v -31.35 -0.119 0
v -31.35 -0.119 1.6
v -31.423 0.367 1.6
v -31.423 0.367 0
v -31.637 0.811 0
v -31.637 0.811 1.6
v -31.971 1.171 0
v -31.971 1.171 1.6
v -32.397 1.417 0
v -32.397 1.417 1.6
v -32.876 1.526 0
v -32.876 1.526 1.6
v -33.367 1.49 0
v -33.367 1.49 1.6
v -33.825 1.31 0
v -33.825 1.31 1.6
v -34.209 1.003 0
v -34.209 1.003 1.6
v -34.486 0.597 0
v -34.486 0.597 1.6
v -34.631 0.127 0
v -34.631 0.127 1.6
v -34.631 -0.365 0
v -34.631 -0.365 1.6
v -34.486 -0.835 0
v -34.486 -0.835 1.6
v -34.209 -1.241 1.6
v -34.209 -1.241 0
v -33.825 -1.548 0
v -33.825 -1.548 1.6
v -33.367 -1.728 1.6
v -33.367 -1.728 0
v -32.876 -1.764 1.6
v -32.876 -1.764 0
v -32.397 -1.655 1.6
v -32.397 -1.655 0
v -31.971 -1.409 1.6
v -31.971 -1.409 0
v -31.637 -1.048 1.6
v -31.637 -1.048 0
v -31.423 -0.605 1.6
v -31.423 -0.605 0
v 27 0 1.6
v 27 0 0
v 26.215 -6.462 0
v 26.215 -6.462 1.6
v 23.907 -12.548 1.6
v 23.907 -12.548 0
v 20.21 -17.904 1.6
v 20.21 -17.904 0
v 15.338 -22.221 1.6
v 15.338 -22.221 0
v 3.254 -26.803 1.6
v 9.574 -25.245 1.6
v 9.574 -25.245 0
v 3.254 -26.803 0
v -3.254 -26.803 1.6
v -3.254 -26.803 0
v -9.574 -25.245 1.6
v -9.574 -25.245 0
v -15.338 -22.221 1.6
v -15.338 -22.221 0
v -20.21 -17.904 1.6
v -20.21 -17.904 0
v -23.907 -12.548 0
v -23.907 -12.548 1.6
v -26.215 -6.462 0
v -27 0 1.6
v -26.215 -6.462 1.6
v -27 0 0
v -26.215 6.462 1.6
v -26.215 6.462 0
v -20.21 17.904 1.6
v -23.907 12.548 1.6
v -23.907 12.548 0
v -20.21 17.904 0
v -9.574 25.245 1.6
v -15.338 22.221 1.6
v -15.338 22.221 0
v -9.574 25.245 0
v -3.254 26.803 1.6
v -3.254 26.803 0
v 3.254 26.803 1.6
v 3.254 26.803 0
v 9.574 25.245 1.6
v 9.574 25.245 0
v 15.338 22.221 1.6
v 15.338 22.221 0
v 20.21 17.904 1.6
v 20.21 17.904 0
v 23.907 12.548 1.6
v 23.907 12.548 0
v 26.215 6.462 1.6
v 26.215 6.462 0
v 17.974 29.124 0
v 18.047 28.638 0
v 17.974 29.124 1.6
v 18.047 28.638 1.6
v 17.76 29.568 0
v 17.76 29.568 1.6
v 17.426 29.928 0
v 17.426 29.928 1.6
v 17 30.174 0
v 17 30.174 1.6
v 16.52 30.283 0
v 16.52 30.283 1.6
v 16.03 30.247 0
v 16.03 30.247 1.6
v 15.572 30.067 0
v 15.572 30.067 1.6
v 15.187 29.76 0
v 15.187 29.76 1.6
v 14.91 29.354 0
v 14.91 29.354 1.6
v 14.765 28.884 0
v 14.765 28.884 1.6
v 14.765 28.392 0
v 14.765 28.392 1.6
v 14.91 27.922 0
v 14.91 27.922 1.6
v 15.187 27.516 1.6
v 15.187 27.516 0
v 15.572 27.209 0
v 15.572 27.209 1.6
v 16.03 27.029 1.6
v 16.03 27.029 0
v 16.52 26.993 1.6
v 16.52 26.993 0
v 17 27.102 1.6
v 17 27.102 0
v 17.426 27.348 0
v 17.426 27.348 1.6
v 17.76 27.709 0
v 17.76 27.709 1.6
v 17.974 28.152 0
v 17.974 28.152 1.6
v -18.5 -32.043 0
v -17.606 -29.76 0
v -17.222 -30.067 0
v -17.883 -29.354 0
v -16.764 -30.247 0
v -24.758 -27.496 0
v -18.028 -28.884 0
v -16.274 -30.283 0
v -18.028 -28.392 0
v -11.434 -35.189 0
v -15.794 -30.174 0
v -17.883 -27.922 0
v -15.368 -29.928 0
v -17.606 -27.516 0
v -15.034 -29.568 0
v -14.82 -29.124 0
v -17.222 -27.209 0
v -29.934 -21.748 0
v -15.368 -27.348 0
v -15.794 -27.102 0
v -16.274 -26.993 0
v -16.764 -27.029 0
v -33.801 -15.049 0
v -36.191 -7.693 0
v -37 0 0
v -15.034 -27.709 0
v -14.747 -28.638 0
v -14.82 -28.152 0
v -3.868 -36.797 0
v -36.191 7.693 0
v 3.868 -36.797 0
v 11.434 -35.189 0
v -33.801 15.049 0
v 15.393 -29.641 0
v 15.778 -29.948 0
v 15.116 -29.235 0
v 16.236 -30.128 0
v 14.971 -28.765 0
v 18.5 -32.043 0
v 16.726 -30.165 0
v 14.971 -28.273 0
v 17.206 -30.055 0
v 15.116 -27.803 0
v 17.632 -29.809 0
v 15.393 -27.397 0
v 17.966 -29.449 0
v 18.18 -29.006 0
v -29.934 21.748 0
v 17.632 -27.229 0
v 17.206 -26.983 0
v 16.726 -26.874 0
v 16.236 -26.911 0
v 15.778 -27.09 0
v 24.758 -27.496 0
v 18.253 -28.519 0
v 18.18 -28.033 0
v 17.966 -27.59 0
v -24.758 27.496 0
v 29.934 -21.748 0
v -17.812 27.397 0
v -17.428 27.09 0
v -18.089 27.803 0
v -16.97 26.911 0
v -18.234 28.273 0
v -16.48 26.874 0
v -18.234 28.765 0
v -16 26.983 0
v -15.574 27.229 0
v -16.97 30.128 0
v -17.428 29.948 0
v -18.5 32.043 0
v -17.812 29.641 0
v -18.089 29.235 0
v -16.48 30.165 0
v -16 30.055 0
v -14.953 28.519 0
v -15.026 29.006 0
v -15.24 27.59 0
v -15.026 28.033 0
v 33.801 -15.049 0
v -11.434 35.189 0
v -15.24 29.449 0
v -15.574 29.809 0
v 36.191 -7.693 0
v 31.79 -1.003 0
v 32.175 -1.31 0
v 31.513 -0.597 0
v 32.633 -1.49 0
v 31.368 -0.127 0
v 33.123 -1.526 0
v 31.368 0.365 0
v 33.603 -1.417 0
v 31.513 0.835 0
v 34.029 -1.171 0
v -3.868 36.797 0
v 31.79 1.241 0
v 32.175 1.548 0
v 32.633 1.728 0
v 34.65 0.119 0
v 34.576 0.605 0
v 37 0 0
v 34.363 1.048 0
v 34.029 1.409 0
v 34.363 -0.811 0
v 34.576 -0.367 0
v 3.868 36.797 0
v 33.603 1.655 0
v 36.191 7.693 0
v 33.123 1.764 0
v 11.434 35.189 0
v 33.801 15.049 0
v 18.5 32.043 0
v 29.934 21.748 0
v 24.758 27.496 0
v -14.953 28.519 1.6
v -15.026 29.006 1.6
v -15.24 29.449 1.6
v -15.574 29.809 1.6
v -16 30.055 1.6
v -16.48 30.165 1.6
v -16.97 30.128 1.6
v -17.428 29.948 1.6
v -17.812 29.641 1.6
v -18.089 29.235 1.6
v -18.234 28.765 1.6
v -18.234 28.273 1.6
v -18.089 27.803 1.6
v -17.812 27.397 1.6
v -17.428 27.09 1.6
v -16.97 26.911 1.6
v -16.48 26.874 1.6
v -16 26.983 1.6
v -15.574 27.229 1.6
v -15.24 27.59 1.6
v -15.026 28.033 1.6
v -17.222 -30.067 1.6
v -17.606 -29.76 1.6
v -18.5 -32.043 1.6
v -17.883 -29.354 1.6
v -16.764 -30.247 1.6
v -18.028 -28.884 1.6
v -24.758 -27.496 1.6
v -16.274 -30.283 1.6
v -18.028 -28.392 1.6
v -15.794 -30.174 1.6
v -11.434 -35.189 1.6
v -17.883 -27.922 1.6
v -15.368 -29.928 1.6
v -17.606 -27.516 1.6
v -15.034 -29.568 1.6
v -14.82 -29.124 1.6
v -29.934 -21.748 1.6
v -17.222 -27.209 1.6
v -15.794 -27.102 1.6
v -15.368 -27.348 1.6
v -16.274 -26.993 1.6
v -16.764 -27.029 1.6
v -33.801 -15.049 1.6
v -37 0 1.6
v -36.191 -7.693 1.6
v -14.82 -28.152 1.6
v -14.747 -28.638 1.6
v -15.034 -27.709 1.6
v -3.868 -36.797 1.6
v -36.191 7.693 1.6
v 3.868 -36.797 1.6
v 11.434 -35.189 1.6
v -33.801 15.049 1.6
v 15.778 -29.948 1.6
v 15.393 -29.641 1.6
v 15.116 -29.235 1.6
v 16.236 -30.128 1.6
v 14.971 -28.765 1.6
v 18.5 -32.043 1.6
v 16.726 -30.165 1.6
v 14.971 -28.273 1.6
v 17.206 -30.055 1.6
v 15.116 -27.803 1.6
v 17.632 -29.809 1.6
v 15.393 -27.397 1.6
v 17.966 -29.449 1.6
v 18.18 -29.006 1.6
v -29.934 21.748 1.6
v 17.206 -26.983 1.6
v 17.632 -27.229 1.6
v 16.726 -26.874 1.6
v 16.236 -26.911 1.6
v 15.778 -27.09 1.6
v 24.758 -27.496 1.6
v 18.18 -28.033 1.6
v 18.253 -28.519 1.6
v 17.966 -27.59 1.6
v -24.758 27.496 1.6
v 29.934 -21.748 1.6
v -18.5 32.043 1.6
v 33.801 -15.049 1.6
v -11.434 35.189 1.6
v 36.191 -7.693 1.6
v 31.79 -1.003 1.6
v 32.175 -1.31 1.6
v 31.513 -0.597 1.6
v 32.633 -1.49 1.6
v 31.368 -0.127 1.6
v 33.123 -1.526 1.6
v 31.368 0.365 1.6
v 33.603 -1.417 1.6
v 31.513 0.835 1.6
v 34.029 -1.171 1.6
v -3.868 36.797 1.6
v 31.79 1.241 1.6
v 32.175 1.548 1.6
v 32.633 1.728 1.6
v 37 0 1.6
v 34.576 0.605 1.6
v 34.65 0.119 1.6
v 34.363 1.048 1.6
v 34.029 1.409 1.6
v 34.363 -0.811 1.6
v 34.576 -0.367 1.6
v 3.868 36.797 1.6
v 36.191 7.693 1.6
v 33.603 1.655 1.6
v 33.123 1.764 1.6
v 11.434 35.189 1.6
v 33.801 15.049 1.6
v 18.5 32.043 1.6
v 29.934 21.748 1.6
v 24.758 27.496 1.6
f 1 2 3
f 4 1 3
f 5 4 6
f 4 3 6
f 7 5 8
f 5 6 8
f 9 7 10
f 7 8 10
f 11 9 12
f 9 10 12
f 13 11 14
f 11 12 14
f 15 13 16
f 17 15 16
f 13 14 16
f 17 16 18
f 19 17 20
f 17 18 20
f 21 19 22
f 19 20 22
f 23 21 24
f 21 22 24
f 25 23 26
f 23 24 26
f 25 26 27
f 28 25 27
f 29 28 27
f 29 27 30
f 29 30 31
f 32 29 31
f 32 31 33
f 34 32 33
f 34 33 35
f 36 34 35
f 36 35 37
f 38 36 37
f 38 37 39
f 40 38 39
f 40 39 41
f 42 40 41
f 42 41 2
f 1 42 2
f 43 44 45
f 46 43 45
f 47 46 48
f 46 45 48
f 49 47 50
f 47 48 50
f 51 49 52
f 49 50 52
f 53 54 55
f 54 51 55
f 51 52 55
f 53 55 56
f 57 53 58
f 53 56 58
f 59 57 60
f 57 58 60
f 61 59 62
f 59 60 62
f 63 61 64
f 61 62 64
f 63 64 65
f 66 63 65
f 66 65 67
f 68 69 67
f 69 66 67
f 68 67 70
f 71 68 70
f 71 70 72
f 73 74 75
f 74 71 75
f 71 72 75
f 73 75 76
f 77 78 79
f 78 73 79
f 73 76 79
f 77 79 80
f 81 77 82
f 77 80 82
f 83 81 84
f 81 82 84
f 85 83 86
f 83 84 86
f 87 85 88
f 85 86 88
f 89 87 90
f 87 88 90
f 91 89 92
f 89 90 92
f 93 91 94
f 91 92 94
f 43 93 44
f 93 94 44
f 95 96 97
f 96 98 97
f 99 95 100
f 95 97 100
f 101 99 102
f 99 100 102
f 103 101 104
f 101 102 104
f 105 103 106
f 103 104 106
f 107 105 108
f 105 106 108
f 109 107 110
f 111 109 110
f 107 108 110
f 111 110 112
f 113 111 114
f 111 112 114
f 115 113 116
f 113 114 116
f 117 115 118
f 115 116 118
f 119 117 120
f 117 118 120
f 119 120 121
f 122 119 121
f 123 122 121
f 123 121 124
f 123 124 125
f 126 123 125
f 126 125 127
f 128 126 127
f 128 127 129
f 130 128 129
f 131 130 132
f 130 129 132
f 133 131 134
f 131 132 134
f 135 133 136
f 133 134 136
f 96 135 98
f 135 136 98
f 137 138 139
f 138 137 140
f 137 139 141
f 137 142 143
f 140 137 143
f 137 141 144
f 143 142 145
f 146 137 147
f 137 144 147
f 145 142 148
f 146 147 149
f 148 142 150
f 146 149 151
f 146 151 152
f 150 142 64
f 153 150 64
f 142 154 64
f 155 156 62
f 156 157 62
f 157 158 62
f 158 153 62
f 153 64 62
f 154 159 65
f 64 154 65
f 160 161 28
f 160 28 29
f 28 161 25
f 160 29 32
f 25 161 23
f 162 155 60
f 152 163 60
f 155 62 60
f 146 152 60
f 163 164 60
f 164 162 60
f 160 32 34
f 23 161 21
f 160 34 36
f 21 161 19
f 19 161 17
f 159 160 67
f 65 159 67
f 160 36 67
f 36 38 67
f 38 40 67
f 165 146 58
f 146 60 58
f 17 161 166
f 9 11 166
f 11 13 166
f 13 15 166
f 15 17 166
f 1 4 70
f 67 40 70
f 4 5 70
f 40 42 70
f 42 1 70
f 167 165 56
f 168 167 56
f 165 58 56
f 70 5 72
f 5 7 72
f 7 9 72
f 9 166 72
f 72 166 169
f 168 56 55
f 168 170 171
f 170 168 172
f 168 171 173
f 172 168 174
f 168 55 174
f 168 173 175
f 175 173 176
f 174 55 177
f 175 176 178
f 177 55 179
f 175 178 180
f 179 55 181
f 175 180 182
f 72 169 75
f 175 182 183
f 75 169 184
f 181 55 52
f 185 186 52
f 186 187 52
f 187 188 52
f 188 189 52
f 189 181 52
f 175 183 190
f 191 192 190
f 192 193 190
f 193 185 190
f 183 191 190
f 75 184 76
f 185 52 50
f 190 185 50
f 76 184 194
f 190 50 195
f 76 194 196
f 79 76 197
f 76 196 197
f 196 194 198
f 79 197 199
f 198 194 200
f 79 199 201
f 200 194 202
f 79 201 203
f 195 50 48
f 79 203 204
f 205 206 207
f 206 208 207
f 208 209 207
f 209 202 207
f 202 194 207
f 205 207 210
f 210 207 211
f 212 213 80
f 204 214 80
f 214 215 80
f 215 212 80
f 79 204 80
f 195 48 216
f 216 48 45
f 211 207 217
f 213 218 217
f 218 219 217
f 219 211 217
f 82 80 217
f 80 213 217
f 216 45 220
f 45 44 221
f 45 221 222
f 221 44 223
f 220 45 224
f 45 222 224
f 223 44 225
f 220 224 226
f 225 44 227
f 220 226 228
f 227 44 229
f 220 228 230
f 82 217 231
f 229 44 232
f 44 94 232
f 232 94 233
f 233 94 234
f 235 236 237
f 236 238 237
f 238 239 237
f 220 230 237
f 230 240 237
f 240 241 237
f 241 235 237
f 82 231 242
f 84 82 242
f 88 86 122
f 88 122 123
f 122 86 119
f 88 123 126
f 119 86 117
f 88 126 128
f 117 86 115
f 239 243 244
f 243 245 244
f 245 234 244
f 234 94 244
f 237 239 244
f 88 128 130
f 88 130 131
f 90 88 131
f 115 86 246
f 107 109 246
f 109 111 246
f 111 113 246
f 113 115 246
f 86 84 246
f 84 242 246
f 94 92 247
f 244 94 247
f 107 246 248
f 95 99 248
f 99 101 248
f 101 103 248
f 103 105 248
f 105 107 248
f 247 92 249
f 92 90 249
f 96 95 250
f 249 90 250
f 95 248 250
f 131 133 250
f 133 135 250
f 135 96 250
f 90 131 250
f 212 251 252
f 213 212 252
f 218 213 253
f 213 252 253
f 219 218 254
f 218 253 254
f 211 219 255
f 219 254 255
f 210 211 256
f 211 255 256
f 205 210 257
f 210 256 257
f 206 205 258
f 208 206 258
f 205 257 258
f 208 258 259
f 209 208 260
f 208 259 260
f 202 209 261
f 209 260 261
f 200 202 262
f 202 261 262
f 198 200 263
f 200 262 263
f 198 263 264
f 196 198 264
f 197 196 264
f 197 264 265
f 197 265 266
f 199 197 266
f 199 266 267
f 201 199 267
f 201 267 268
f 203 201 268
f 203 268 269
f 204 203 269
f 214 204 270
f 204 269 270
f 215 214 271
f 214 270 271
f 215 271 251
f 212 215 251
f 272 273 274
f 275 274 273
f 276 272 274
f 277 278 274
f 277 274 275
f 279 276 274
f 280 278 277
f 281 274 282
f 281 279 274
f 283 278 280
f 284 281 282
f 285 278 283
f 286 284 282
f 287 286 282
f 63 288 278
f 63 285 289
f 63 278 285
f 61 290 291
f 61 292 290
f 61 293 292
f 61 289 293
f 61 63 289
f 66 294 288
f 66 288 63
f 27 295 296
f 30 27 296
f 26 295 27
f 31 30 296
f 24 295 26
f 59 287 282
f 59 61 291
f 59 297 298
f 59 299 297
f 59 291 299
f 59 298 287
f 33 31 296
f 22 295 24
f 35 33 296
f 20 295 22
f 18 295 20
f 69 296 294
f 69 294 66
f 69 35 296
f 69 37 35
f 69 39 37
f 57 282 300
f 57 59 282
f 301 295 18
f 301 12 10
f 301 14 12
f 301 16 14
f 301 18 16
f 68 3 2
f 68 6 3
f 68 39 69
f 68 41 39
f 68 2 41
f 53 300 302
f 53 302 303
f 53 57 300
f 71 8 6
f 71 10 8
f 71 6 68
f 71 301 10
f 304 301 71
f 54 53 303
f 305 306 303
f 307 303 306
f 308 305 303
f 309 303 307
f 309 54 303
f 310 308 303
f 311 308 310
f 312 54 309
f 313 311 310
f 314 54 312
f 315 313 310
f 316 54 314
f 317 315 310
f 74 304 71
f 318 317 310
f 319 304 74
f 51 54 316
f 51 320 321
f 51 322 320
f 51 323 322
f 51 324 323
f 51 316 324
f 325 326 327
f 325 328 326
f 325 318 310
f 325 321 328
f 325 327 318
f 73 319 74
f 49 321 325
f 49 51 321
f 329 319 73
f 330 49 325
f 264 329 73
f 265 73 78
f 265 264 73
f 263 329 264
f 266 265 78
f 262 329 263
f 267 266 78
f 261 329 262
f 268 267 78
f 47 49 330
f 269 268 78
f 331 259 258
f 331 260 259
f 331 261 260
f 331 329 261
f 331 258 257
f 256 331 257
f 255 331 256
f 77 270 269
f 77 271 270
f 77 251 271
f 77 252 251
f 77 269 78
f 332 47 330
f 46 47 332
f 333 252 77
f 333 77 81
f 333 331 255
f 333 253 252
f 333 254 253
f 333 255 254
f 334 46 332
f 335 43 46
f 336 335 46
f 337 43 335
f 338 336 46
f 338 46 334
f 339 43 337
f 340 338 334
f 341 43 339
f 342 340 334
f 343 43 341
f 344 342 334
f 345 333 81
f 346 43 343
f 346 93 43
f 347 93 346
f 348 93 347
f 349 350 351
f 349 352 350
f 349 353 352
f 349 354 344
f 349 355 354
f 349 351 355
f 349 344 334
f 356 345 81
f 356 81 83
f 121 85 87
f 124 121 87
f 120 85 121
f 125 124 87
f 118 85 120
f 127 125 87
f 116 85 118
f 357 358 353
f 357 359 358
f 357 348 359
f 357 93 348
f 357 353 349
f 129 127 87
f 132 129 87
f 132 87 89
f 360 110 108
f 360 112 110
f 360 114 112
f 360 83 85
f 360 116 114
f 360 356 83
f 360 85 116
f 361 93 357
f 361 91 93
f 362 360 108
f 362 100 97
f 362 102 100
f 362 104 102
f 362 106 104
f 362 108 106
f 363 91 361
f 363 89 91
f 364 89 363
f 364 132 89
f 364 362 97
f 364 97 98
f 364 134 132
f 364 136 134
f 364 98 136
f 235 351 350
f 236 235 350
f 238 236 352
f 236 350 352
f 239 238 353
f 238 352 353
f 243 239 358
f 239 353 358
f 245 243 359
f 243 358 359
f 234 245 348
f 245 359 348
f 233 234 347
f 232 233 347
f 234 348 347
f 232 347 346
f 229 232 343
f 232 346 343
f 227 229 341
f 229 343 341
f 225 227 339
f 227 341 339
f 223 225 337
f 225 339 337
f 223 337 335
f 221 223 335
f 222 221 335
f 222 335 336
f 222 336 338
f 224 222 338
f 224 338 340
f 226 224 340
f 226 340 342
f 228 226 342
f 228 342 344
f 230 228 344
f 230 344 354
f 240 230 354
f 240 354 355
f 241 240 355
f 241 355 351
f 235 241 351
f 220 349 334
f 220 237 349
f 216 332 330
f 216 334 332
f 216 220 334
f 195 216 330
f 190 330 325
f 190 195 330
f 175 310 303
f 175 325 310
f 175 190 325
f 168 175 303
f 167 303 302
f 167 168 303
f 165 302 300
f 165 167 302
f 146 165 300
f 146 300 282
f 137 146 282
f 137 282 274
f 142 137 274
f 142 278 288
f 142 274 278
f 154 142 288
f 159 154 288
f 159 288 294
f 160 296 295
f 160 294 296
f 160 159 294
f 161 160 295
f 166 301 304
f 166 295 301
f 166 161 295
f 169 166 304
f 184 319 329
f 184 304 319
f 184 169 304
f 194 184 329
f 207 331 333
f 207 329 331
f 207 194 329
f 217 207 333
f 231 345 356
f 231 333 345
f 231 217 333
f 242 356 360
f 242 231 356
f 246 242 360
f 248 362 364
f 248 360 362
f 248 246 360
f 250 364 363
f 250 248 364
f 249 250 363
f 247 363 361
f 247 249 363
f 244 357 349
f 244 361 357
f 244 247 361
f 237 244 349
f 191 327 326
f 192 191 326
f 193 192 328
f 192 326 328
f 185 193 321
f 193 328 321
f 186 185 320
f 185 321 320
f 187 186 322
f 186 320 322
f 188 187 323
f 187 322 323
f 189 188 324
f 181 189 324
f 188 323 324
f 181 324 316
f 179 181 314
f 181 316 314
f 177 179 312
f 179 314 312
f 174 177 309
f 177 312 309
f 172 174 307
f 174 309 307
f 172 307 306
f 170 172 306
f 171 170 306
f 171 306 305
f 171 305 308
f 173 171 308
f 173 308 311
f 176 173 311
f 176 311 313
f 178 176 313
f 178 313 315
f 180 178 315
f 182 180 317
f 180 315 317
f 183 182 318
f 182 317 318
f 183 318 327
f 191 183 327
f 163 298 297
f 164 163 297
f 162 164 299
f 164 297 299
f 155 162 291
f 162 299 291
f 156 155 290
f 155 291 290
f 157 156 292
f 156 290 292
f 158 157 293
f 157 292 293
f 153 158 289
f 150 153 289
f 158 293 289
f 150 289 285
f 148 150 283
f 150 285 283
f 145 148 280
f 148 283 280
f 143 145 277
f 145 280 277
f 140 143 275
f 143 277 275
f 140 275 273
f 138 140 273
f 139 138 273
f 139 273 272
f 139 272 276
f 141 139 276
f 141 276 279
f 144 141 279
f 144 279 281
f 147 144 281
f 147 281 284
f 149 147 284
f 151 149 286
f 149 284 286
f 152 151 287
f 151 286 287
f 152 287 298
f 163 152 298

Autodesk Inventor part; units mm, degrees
ref_plane "YZ Plane" through (0, 0, 0) normal (1, 0, 0) x (0, 1, 0)
ref_plane "XZ Plane" through (0, 0, 0) normal (0, 1, 0) x (-1, 0, 0)
ref_plane "XY Plane" through (0, 0, 0) normal (0, 0, 1) x (1, 0, 0)
sketch "Sketch1" plane through (0, 0, 0) normal (0, 0, 1) x (1, 0, 0)
  circle A0 centre (0, 0) radius 29
  circle A1 centre (0, 0) radius 27
  circle A2 centre (0, 0) radius 37
  dimension "d0" = 58
  dimension "d1" = 2
  dimension "d2" = 8
extrude "Extrusion1" add sketch "Sketch1" along normal blind 1.6 contours A0 | A2
sketch "Sketch2" plane through (0, 0, 1.6) normal (0, 0, 1) x (1, 0, 0)
  circle A0 centre (-32.9998, -0.1189) radius 1.25 projected
  circle A1 centre (-16.3969, -28.6381) radius 1.25 projected
  circle A2 centre (-16.6029, 28.5192) radius 1.25 projected
  circle A3 centre (16.3969, 28.6381) radius 1.25 projected
  circle A4 centre (16.6029, -28.5192) radius 1.25 projected
  circle A5 centre (32.9998, 0.1189) radius 1.25 projected
  circle A6 centre (-32.9998, -0.1189) radius 1.65
  circle A7 centre (-16.3969, -28.6381) radius 1.65
  circle A8 centre (16.6029, -28.5192) radius 1.65
  circle A9 centre (32.9998, 0.1189) radius 1.65
  circle A10 centre (16.3969, 28.6381) radius 1.65
  circle A11 centre (-16.6029, 28.5192) radius 1.65
  point P0 (0, 0)
  dimension "d5" = 3.3
  dimension "d8" = 360
extrude "Extrusion2" cut sketch "Sketch2" against normal through all contours A0 | A1 | A2 | A3 | A4 | A5 | A6 | A7 | A8 | A9 | A10 | A11
properties part number "stator_mount_ret"
